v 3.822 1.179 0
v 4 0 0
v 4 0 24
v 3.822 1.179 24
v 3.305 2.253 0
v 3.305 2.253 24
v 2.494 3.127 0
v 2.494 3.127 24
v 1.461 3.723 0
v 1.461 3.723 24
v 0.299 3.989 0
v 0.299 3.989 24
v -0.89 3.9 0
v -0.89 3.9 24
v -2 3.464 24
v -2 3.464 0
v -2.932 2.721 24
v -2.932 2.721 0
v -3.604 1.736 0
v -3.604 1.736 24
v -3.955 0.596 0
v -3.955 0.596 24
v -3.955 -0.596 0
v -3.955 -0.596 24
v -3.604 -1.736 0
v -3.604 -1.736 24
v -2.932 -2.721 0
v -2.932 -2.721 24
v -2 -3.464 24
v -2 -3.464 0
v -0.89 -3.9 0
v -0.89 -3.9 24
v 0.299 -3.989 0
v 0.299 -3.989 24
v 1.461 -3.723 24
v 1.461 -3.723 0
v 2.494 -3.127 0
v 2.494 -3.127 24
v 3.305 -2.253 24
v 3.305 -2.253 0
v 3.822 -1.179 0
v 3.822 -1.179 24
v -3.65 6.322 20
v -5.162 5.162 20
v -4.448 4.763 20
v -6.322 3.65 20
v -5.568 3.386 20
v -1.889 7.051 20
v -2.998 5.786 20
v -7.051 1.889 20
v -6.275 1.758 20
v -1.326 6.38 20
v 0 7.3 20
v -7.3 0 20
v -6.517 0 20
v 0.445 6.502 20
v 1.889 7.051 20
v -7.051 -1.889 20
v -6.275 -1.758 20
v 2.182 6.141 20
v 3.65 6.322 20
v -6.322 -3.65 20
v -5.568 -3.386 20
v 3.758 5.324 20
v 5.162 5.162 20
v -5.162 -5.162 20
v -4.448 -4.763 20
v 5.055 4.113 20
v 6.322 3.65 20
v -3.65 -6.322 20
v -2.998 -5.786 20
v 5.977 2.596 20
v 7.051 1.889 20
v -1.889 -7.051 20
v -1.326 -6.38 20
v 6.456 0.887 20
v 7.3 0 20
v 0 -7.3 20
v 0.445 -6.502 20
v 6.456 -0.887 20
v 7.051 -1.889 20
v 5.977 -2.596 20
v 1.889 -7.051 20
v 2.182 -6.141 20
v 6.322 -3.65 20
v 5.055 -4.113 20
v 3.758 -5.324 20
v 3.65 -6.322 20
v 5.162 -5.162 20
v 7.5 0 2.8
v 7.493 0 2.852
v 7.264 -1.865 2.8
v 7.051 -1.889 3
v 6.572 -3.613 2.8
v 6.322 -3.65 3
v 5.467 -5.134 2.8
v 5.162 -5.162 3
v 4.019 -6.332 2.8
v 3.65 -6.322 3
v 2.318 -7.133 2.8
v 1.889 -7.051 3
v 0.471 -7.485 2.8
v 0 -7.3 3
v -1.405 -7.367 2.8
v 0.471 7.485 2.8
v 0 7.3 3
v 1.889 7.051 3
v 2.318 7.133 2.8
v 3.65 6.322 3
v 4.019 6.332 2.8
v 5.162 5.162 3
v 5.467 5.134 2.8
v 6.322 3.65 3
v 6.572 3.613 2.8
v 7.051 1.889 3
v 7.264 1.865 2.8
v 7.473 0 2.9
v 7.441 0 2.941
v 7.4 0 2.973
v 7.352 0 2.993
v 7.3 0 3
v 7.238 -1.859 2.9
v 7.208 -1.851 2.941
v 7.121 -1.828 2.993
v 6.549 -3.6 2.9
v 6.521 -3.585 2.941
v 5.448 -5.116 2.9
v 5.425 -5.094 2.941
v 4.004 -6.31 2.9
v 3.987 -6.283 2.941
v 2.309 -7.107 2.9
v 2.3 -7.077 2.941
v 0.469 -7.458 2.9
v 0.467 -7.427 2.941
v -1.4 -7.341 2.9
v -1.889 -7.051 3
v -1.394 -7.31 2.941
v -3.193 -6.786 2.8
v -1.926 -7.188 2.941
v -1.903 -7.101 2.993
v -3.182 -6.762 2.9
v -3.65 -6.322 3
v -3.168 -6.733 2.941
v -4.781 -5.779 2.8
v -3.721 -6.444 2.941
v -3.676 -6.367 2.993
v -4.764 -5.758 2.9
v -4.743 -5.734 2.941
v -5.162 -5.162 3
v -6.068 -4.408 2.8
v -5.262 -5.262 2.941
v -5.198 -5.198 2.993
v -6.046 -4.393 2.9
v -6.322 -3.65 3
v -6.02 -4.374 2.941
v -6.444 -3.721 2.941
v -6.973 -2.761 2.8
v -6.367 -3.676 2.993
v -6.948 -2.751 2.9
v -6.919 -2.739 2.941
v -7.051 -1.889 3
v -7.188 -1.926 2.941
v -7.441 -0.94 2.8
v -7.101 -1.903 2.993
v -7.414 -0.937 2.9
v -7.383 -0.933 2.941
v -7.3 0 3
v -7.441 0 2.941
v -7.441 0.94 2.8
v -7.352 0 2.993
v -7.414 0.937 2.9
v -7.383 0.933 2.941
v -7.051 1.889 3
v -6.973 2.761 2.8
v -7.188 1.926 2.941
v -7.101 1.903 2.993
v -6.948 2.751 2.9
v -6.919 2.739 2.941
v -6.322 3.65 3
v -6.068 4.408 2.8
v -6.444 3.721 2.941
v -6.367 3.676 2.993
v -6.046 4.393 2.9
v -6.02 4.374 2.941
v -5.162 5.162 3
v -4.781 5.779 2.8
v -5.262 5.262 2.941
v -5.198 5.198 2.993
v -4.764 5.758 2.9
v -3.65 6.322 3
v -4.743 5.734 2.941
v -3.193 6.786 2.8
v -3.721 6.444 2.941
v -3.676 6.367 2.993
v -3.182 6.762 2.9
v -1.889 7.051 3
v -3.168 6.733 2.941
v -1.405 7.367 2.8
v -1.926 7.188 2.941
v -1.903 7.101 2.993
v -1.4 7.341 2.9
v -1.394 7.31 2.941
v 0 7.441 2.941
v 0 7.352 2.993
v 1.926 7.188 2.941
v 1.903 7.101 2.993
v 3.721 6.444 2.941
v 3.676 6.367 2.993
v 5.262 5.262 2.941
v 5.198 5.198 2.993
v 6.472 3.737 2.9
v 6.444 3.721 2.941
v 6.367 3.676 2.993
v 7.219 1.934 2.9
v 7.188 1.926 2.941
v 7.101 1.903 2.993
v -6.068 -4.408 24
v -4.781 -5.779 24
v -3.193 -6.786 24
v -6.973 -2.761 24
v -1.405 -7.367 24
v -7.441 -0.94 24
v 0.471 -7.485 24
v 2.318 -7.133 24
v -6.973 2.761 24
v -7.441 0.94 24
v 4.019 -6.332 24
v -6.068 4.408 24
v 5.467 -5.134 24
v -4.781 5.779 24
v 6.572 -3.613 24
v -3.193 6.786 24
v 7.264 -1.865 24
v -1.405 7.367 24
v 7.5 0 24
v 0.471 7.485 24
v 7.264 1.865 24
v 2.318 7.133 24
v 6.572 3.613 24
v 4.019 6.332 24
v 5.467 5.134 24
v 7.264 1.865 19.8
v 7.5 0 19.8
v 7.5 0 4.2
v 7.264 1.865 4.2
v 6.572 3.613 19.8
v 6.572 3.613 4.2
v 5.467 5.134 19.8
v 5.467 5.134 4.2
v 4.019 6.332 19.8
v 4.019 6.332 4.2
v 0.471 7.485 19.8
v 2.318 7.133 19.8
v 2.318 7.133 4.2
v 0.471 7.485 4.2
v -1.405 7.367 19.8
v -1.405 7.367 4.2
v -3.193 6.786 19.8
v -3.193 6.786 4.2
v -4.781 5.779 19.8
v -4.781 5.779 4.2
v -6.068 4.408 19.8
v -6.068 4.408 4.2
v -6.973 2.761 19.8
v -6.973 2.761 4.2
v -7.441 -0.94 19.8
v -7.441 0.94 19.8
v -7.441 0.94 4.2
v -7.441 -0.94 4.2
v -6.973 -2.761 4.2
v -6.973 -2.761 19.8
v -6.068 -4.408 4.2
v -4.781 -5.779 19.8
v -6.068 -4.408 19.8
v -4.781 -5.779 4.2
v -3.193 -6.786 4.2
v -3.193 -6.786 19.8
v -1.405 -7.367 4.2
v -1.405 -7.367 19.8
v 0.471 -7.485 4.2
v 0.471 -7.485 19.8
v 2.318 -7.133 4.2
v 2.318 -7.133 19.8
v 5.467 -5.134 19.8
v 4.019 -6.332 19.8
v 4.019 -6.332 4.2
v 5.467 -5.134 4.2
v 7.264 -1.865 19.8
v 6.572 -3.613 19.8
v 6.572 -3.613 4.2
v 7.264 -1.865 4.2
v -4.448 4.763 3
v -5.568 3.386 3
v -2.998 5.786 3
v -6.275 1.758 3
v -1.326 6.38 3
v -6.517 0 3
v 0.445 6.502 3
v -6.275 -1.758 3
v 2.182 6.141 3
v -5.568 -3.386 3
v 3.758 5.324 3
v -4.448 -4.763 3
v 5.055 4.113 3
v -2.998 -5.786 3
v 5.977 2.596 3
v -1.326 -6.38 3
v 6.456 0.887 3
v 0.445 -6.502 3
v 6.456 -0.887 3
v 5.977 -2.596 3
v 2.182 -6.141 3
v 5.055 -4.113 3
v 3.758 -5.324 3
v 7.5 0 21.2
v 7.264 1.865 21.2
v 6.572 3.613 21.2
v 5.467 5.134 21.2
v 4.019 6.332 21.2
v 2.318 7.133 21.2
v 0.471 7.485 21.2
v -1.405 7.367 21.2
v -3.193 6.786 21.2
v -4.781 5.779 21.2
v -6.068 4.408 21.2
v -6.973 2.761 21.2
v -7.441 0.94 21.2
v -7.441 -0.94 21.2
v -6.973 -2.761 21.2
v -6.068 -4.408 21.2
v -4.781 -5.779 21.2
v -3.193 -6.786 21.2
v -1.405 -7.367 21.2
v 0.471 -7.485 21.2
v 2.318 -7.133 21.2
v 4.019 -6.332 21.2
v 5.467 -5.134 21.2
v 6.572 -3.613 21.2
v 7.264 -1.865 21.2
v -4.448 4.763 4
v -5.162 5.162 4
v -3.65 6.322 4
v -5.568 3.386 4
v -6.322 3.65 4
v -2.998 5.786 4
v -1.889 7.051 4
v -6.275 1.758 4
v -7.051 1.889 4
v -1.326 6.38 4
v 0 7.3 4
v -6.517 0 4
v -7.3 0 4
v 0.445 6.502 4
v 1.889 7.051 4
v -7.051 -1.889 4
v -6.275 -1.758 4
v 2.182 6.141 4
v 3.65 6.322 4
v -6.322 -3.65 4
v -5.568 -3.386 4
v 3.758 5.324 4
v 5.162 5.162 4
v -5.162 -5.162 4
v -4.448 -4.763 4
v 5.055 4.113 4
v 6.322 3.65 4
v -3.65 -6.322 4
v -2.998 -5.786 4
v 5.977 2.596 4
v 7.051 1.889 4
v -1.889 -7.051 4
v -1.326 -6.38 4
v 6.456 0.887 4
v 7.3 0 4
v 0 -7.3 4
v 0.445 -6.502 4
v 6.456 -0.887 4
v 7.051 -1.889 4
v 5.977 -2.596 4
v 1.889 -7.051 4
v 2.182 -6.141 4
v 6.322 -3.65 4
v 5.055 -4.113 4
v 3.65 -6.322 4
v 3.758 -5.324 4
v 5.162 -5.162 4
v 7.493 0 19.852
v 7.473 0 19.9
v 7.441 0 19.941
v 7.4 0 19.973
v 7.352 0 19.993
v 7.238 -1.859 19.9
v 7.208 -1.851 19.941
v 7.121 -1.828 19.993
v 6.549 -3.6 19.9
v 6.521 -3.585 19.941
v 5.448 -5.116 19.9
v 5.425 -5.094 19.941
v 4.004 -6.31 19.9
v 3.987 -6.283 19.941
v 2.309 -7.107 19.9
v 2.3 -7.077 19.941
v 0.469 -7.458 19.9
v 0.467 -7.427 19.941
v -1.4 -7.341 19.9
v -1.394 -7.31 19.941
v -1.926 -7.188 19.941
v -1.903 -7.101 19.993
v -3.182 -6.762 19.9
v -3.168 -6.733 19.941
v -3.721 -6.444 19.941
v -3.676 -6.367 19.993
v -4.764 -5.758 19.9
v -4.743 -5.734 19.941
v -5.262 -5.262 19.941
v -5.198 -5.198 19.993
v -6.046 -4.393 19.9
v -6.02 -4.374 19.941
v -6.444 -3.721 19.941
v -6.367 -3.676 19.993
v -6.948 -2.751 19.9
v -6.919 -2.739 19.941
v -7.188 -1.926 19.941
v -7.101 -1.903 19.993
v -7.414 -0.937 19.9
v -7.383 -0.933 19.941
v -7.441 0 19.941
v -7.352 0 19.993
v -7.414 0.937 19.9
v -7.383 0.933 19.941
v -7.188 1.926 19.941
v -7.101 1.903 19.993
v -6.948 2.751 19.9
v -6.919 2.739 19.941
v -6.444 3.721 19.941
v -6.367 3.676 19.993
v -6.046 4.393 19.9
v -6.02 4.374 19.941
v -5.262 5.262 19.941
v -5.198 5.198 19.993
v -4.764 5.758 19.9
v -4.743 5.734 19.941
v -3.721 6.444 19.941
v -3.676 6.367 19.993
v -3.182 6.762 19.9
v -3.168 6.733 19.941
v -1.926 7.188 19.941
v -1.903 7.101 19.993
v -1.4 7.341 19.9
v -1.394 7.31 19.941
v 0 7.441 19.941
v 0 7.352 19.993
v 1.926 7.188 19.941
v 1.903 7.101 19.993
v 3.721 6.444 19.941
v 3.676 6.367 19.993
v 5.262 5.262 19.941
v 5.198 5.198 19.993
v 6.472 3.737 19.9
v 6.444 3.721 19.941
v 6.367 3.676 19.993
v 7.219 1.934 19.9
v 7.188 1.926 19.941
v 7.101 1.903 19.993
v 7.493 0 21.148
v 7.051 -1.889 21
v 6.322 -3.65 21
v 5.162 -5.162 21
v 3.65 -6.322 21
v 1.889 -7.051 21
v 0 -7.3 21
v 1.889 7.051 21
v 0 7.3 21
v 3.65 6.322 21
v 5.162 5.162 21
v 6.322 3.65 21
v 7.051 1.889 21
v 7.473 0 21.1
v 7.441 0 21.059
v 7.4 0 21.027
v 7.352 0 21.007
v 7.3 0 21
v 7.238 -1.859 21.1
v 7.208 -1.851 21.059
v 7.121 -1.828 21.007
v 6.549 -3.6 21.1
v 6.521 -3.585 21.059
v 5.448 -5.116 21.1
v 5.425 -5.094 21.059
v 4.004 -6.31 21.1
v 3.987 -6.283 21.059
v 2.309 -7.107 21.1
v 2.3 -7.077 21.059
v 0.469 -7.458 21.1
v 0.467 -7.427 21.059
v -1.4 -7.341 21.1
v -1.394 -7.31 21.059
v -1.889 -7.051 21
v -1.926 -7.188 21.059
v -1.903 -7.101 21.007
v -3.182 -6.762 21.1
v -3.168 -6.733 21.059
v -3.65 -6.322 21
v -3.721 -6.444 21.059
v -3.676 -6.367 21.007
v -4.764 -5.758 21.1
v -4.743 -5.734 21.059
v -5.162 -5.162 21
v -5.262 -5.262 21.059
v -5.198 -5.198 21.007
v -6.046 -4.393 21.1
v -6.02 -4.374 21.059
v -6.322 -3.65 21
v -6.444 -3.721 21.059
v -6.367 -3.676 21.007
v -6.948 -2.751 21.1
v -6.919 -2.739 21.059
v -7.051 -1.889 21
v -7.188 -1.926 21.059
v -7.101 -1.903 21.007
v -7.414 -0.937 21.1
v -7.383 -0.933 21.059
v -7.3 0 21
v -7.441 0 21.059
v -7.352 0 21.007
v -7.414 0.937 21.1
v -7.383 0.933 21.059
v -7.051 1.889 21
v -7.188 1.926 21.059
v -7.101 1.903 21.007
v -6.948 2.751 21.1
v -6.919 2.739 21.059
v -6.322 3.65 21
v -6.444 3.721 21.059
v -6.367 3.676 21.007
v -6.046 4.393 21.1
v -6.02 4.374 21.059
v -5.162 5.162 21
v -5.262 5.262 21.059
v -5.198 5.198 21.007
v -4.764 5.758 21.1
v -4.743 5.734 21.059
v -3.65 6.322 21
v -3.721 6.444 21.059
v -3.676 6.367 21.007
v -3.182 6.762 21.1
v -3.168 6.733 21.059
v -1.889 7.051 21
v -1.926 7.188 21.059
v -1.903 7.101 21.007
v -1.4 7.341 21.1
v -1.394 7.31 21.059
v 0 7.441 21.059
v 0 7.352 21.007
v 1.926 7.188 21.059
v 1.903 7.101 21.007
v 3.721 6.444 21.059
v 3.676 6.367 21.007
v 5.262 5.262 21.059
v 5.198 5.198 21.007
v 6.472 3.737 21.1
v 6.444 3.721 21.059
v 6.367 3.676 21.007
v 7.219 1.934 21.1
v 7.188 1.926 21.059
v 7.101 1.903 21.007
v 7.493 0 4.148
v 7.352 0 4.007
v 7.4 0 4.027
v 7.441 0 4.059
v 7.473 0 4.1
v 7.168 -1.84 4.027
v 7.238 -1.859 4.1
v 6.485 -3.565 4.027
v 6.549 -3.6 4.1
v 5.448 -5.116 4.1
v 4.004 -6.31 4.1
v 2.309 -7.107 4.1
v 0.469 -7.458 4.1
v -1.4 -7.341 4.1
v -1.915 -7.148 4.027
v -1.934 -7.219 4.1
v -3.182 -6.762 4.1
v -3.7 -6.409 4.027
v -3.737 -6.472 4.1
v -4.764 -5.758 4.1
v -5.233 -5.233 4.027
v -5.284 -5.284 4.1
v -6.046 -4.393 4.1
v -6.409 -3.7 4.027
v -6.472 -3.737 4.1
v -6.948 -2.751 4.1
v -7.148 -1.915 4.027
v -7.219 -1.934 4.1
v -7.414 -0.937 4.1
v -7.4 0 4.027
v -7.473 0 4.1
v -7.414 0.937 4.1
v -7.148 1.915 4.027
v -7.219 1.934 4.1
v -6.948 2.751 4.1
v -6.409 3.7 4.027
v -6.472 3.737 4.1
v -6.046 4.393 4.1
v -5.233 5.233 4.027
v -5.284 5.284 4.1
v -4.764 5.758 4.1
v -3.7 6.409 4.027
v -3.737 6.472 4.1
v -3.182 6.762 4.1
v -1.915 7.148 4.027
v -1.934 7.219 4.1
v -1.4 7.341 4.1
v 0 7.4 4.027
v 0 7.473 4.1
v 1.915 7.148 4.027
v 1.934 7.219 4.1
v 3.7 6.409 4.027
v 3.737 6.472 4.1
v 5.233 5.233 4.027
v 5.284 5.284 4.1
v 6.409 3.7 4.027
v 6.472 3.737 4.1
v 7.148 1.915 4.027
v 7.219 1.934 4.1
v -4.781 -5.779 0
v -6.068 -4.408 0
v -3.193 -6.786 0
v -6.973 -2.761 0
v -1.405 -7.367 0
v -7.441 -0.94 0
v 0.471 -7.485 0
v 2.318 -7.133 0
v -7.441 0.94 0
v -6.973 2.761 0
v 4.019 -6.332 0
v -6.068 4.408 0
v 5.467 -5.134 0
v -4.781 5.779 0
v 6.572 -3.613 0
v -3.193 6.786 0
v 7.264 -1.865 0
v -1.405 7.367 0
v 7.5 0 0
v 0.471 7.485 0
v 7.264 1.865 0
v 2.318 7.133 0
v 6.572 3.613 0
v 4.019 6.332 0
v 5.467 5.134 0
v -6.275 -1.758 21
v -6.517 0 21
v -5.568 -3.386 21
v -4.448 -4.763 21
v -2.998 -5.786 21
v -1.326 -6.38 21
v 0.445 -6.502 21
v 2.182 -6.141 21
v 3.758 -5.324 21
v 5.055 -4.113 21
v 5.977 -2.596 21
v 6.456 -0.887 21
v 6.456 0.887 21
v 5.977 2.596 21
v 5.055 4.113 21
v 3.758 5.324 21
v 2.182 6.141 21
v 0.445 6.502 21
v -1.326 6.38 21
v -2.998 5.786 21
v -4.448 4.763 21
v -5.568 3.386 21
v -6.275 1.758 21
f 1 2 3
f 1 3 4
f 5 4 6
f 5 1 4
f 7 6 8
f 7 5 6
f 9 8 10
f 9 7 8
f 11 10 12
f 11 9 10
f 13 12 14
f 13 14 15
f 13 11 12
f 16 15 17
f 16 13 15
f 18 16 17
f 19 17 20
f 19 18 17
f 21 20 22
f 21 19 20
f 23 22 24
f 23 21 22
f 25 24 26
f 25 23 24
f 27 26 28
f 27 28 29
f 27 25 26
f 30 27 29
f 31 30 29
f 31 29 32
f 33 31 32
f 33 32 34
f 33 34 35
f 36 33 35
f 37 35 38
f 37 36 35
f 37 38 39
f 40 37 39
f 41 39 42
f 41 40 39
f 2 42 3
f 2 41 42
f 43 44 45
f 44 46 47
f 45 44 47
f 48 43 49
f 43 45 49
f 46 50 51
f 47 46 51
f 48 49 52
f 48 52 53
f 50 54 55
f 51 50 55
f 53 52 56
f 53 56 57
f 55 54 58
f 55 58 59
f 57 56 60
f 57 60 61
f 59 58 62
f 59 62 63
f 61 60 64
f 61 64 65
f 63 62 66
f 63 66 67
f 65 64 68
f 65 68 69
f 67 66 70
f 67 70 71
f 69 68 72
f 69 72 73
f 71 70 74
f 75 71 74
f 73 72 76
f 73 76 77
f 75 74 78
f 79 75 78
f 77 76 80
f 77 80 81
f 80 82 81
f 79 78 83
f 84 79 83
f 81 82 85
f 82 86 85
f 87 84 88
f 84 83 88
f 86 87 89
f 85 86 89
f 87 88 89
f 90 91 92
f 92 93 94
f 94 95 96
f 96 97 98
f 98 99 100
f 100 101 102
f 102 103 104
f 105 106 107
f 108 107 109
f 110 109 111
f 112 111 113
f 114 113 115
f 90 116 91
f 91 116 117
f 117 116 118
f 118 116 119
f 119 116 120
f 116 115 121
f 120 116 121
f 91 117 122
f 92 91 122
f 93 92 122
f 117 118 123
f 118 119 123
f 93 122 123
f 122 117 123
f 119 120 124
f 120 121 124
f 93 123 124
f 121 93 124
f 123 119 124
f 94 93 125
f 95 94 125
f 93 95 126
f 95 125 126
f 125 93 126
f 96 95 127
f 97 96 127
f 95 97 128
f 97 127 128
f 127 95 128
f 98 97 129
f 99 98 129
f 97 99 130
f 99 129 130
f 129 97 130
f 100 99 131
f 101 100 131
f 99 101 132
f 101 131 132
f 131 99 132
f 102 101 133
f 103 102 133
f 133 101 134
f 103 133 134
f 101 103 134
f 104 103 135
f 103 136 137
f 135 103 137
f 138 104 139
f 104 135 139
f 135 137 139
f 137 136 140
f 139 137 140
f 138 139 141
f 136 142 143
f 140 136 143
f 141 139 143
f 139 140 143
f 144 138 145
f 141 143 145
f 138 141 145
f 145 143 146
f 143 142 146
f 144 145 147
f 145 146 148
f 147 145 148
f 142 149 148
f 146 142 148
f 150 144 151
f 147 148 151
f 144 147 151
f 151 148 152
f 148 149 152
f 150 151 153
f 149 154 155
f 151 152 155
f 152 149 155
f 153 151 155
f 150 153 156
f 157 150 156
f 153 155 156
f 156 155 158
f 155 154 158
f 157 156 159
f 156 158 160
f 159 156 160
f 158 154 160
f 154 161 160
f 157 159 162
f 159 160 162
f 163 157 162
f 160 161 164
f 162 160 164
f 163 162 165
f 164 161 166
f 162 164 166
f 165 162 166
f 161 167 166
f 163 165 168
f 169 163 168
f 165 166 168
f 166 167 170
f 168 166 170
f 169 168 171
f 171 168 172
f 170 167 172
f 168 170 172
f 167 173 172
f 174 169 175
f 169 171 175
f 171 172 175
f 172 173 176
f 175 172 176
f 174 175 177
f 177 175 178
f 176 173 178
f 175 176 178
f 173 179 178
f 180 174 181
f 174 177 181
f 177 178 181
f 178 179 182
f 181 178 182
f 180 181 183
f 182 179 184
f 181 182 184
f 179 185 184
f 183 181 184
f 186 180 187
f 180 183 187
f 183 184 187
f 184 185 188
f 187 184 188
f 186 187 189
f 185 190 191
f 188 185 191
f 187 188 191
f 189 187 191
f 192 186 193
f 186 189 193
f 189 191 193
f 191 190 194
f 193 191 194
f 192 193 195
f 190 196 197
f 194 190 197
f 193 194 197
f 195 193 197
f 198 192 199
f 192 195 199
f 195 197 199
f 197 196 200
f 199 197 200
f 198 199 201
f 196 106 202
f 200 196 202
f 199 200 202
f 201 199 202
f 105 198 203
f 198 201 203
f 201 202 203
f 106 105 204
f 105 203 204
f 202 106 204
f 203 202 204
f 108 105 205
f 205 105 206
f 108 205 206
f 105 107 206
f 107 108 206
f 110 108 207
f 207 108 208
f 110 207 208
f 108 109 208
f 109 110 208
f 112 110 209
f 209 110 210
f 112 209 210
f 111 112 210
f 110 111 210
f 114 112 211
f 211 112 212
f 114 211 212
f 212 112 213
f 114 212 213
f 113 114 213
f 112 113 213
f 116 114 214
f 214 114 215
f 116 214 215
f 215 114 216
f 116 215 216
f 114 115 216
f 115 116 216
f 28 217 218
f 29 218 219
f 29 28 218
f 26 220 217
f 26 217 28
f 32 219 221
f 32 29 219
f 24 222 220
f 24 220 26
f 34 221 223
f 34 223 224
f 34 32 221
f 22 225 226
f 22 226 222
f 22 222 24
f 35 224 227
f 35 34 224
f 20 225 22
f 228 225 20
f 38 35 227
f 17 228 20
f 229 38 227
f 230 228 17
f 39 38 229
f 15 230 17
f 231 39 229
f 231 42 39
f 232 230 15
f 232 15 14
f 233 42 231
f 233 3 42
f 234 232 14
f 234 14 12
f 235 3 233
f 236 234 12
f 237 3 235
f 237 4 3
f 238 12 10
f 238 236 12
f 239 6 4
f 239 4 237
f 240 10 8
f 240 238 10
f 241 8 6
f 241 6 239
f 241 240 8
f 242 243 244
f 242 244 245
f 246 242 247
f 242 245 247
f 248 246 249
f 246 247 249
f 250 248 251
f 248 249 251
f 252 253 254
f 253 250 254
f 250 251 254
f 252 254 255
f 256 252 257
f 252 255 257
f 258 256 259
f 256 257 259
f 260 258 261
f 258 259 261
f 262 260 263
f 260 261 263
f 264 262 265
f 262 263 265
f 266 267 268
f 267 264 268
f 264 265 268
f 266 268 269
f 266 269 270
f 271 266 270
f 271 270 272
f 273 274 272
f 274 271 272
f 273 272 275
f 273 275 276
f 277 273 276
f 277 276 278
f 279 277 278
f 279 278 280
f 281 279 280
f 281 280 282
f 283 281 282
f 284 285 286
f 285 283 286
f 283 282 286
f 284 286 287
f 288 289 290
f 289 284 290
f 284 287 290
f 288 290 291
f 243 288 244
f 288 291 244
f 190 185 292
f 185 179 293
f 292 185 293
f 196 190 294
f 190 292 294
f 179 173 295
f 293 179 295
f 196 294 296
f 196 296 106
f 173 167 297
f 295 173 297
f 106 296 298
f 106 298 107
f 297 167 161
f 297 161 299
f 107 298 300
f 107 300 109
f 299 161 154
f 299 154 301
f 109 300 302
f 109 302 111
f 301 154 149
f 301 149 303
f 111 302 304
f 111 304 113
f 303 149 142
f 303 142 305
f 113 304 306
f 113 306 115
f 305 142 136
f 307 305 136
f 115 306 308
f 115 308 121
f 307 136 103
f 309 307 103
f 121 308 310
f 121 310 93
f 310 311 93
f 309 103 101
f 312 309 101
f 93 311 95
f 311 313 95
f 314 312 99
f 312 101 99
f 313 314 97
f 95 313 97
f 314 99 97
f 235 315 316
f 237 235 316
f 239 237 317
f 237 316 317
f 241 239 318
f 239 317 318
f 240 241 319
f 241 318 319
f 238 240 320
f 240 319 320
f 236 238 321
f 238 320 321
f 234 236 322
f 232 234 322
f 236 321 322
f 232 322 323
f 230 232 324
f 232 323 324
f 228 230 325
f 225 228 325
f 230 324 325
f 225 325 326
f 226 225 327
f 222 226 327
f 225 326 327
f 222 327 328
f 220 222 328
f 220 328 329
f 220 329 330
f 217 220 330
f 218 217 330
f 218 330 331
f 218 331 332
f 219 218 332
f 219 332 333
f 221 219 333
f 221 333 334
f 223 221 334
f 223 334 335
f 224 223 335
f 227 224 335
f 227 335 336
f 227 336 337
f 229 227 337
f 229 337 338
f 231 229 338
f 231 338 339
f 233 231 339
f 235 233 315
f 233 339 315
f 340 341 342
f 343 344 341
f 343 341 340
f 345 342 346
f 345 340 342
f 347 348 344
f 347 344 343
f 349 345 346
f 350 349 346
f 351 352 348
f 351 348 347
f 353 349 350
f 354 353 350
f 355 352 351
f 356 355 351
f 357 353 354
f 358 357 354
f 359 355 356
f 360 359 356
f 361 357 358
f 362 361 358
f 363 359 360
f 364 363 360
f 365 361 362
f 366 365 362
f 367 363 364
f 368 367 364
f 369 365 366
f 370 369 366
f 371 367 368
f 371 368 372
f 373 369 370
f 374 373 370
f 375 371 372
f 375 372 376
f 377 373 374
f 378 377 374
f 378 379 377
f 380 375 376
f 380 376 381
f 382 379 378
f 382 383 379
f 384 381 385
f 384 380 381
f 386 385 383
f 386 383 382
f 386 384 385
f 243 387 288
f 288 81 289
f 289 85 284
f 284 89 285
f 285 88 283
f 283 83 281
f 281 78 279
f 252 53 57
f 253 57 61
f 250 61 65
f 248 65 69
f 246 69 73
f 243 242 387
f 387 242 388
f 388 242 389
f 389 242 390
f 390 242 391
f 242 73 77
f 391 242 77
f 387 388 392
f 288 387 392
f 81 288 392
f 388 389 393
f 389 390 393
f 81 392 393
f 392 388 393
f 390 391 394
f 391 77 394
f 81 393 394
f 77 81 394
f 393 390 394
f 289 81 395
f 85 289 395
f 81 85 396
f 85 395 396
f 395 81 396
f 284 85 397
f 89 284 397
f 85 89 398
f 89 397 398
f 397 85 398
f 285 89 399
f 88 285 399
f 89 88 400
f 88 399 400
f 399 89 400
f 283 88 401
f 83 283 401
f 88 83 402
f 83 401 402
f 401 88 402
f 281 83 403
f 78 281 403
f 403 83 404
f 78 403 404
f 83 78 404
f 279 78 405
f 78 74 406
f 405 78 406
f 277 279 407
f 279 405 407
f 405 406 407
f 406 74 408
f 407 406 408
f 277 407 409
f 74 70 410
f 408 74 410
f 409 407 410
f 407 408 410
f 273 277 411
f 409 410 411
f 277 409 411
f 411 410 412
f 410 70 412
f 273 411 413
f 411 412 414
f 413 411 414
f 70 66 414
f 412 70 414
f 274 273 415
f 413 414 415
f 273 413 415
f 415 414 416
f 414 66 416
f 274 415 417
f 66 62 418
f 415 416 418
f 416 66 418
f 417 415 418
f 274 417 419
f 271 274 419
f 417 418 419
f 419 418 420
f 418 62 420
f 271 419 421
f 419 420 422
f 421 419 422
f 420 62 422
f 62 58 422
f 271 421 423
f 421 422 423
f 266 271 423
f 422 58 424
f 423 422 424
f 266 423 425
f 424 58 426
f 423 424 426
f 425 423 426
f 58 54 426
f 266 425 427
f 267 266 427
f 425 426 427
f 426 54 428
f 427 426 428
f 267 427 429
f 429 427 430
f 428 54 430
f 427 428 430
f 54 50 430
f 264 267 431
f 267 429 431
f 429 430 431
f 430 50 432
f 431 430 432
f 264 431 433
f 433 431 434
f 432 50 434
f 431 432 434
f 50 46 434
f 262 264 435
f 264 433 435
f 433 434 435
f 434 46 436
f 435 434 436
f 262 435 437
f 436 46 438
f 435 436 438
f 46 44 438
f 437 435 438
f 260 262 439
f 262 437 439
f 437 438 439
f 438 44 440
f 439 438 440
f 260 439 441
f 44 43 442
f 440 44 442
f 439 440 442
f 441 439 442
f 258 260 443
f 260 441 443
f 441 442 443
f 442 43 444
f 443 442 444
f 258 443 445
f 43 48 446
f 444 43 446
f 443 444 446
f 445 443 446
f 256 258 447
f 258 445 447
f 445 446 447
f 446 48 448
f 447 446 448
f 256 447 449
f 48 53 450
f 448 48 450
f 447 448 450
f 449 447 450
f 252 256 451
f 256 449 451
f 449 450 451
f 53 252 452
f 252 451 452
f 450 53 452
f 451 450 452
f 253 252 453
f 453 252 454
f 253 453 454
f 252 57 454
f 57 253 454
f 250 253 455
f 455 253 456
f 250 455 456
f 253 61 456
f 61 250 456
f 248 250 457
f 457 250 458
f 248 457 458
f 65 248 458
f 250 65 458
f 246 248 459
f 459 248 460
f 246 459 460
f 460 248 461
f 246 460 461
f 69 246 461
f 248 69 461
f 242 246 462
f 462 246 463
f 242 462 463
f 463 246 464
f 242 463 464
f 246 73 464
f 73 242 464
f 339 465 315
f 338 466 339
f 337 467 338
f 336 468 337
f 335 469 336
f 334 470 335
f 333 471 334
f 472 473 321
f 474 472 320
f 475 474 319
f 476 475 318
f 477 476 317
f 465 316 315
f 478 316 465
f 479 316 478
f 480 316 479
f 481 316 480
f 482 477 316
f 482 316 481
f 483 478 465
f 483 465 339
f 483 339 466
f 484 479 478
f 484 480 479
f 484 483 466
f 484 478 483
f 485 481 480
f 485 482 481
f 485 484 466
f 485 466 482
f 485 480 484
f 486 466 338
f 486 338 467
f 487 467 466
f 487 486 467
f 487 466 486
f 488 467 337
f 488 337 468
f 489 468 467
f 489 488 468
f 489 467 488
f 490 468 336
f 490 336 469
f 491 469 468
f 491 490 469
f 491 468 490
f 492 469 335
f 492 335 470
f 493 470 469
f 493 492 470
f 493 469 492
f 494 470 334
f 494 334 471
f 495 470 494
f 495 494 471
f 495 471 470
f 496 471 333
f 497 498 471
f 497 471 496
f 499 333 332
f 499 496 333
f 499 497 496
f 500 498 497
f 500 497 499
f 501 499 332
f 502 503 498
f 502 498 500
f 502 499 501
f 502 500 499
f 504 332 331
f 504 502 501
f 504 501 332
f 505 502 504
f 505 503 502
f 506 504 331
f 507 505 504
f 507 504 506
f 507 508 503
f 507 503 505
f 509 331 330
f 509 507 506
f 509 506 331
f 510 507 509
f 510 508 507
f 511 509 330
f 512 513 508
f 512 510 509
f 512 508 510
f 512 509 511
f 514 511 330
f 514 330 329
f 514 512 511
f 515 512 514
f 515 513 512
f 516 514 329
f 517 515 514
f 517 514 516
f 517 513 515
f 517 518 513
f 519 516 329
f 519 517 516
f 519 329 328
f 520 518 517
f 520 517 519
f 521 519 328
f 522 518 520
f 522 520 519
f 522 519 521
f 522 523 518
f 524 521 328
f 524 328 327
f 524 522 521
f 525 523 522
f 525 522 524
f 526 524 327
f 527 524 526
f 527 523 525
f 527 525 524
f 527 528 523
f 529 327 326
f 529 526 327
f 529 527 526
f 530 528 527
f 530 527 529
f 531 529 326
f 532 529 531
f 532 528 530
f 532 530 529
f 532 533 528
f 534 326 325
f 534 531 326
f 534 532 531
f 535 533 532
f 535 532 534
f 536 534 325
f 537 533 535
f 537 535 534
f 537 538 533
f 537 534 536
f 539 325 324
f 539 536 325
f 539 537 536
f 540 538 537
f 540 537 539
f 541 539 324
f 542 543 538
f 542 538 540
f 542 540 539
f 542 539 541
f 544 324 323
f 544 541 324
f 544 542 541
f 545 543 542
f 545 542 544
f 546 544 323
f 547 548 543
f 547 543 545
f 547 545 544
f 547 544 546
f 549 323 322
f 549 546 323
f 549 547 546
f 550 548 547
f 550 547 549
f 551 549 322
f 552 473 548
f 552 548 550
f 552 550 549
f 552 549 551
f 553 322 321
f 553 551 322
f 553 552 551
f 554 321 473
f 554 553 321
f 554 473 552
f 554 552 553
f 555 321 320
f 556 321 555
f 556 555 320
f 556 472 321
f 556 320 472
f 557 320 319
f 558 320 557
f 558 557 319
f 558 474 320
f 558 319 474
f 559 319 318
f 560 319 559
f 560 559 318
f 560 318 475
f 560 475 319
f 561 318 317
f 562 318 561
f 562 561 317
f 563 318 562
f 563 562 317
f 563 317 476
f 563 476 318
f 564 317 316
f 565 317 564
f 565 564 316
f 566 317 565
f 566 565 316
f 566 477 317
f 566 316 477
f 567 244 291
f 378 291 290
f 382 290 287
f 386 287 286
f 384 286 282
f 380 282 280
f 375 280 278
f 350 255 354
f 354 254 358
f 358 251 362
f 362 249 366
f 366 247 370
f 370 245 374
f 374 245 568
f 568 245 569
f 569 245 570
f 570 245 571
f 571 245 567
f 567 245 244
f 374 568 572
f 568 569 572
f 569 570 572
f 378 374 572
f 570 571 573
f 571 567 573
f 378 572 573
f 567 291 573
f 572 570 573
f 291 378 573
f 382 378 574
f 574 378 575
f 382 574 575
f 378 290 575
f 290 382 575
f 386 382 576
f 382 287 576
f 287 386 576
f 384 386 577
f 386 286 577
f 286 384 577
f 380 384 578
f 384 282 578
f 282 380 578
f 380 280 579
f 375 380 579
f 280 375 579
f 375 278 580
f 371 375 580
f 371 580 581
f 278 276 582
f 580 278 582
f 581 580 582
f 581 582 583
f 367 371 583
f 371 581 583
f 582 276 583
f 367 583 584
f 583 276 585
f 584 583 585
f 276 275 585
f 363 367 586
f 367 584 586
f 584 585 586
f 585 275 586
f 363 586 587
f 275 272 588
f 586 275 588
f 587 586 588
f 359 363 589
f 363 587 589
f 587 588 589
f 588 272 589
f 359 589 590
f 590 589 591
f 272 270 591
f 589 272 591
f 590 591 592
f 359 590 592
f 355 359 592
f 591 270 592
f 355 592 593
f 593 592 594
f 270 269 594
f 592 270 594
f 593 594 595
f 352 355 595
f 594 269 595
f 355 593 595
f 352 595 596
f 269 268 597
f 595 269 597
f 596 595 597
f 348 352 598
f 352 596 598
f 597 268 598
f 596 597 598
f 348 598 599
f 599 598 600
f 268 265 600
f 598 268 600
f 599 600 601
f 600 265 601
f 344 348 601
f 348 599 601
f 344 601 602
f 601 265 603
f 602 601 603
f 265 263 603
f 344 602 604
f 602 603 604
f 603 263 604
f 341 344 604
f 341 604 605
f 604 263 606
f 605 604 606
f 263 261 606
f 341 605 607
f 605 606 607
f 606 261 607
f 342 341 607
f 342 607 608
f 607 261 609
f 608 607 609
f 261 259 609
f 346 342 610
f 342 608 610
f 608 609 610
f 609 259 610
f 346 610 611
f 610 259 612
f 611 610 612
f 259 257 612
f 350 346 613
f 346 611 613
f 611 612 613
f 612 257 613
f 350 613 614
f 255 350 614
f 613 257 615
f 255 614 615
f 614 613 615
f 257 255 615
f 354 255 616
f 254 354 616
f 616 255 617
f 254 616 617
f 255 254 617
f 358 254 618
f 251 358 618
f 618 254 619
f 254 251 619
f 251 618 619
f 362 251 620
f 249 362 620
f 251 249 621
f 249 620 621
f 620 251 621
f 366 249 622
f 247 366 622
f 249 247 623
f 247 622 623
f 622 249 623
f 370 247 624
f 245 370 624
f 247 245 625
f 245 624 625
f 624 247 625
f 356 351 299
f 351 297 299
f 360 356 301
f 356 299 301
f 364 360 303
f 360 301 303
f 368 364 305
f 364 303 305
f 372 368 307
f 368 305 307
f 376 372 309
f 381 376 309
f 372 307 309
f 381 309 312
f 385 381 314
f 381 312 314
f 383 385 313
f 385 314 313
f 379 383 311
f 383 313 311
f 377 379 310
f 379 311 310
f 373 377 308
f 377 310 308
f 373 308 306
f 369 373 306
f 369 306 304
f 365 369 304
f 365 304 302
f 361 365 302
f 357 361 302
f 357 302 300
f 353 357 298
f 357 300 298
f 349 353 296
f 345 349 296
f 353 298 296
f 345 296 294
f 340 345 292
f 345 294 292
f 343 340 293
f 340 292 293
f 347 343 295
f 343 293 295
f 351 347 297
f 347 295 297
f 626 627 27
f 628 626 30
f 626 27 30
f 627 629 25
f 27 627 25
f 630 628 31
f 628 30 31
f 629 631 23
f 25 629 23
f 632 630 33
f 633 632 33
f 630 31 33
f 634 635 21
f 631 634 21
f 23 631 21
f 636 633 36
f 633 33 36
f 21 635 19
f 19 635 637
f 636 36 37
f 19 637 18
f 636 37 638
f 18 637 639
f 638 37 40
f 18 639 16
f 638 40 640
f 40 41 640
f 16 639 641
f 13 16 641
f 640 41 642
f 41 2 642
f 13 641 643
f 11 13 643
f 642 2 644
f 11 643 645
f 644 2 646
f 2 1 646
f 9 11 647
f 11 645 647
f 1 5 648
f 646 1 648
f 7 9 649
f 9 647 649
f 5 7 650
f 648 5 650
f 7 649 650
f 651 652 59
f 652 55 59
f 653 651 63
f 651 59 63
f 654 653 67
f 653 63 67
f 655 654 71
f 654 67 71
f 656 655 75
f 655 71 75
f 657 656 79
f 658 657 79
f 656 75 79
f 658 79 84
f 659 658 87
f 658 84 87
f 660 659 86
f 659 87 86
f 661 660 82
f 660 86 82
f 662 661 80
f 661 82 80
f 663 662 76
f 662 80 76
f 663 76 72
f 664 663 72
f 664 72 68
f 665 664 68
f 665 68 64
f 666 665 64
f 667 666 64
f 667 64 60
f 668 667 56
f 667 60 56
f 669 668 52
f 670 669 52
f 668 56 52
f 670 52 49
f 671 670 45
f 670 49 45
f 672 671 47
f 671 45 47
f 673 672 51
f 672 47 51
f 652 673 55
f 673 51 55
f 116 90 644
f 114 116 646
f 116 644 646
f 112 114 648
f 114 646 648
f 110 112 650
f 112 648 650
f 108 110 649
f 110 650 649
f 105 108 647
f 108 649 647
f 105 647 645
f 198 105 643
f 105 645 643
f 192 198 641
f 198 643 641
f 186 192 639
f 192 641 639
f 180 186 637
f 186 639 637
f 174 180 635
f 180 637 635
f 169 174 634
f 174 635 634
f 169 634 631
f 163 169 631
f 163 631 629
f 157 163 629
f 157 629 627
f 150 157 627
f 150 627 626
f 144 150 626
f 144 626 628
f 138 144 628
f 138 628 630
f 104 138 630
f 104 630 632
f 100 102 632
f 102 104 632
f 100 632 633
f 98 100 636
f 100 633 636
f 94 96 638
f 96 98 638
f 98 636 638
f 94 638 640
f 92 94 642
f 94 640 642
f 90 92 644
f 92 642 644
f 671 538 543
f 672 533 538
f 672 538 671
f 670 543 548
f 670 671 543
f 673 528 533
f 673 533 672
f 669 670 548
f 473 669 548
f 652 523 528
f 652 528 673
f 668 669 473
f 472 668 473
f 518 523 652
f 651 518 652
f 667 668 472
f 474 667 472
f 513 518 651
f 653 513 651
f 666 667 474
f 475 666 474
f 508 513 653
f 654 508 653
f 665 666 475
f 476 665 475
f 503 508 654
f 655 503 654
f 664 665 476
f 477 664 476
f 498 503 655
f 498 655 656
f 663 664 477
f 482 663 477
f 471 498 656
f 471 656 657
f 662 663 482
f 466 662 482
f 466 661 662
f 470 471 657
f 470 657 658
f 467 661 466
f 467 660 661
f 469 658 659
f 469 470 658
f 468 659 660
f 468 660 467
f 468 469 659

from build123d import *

# Parameters (mm, degrees)
SKETCH_1_R      = 7.5
SKETCH_1_R_2    = 4
EXTRUDE_1_DEPTH = 24
SKETCH_4_W      = 1
SKETCH_4_H      = 1
FILLET_1_R      = 0.2


with BuildPart() as part:
    # 草图1 → 凸台-拉伸1 (new body)
    with BuildSketch(Plane.XY):
        Circle(SKETCH_1_R)
        Circle(SKETCH_1_R_2, mode=Mode.SUBTRACT)
    extrude(amount=EXTRUDE_1_DEPTH)

    # 草图4 → 切除-旋转1 (revolve, cut)
    with BuildSketch(Plane(origin=(0, 0, 0), x_dir=(0, 0, -1), z_dir=(1, 0, 0)), mode=Mode.PRIVATE) as cut_revolve_1_sk:
        with Locations((-20.5, 7.016772844)):
            Rectangle(SKETCH_4_W, SKETCH_4_H)
        with Locations((-3.5, 7.016772844)):
            Rectangle(SKETCH_4_W, SKETCH_4_H)
    revolve(cut_revolve_1_sk.sketch.rotate(Axis((0, 0, 0), (0, 0, 1)), 90), axis=Axis((0, 0, 0), (0, 0, 1)), mode=Mode.SUBTRACT)

    # 圆角1
    fillet_1_edges = [part.edges().sort_by_distance(p)[0] for p in [
        (-7.5, 0, 21),
        (-7.5, 0, 20),
        (-7.5, 0, 4),
        (-7.5, 0, 3),
    ]]
    fillet(fillet_1_edges, radius=FILLET_1_R)


solid = part.part
